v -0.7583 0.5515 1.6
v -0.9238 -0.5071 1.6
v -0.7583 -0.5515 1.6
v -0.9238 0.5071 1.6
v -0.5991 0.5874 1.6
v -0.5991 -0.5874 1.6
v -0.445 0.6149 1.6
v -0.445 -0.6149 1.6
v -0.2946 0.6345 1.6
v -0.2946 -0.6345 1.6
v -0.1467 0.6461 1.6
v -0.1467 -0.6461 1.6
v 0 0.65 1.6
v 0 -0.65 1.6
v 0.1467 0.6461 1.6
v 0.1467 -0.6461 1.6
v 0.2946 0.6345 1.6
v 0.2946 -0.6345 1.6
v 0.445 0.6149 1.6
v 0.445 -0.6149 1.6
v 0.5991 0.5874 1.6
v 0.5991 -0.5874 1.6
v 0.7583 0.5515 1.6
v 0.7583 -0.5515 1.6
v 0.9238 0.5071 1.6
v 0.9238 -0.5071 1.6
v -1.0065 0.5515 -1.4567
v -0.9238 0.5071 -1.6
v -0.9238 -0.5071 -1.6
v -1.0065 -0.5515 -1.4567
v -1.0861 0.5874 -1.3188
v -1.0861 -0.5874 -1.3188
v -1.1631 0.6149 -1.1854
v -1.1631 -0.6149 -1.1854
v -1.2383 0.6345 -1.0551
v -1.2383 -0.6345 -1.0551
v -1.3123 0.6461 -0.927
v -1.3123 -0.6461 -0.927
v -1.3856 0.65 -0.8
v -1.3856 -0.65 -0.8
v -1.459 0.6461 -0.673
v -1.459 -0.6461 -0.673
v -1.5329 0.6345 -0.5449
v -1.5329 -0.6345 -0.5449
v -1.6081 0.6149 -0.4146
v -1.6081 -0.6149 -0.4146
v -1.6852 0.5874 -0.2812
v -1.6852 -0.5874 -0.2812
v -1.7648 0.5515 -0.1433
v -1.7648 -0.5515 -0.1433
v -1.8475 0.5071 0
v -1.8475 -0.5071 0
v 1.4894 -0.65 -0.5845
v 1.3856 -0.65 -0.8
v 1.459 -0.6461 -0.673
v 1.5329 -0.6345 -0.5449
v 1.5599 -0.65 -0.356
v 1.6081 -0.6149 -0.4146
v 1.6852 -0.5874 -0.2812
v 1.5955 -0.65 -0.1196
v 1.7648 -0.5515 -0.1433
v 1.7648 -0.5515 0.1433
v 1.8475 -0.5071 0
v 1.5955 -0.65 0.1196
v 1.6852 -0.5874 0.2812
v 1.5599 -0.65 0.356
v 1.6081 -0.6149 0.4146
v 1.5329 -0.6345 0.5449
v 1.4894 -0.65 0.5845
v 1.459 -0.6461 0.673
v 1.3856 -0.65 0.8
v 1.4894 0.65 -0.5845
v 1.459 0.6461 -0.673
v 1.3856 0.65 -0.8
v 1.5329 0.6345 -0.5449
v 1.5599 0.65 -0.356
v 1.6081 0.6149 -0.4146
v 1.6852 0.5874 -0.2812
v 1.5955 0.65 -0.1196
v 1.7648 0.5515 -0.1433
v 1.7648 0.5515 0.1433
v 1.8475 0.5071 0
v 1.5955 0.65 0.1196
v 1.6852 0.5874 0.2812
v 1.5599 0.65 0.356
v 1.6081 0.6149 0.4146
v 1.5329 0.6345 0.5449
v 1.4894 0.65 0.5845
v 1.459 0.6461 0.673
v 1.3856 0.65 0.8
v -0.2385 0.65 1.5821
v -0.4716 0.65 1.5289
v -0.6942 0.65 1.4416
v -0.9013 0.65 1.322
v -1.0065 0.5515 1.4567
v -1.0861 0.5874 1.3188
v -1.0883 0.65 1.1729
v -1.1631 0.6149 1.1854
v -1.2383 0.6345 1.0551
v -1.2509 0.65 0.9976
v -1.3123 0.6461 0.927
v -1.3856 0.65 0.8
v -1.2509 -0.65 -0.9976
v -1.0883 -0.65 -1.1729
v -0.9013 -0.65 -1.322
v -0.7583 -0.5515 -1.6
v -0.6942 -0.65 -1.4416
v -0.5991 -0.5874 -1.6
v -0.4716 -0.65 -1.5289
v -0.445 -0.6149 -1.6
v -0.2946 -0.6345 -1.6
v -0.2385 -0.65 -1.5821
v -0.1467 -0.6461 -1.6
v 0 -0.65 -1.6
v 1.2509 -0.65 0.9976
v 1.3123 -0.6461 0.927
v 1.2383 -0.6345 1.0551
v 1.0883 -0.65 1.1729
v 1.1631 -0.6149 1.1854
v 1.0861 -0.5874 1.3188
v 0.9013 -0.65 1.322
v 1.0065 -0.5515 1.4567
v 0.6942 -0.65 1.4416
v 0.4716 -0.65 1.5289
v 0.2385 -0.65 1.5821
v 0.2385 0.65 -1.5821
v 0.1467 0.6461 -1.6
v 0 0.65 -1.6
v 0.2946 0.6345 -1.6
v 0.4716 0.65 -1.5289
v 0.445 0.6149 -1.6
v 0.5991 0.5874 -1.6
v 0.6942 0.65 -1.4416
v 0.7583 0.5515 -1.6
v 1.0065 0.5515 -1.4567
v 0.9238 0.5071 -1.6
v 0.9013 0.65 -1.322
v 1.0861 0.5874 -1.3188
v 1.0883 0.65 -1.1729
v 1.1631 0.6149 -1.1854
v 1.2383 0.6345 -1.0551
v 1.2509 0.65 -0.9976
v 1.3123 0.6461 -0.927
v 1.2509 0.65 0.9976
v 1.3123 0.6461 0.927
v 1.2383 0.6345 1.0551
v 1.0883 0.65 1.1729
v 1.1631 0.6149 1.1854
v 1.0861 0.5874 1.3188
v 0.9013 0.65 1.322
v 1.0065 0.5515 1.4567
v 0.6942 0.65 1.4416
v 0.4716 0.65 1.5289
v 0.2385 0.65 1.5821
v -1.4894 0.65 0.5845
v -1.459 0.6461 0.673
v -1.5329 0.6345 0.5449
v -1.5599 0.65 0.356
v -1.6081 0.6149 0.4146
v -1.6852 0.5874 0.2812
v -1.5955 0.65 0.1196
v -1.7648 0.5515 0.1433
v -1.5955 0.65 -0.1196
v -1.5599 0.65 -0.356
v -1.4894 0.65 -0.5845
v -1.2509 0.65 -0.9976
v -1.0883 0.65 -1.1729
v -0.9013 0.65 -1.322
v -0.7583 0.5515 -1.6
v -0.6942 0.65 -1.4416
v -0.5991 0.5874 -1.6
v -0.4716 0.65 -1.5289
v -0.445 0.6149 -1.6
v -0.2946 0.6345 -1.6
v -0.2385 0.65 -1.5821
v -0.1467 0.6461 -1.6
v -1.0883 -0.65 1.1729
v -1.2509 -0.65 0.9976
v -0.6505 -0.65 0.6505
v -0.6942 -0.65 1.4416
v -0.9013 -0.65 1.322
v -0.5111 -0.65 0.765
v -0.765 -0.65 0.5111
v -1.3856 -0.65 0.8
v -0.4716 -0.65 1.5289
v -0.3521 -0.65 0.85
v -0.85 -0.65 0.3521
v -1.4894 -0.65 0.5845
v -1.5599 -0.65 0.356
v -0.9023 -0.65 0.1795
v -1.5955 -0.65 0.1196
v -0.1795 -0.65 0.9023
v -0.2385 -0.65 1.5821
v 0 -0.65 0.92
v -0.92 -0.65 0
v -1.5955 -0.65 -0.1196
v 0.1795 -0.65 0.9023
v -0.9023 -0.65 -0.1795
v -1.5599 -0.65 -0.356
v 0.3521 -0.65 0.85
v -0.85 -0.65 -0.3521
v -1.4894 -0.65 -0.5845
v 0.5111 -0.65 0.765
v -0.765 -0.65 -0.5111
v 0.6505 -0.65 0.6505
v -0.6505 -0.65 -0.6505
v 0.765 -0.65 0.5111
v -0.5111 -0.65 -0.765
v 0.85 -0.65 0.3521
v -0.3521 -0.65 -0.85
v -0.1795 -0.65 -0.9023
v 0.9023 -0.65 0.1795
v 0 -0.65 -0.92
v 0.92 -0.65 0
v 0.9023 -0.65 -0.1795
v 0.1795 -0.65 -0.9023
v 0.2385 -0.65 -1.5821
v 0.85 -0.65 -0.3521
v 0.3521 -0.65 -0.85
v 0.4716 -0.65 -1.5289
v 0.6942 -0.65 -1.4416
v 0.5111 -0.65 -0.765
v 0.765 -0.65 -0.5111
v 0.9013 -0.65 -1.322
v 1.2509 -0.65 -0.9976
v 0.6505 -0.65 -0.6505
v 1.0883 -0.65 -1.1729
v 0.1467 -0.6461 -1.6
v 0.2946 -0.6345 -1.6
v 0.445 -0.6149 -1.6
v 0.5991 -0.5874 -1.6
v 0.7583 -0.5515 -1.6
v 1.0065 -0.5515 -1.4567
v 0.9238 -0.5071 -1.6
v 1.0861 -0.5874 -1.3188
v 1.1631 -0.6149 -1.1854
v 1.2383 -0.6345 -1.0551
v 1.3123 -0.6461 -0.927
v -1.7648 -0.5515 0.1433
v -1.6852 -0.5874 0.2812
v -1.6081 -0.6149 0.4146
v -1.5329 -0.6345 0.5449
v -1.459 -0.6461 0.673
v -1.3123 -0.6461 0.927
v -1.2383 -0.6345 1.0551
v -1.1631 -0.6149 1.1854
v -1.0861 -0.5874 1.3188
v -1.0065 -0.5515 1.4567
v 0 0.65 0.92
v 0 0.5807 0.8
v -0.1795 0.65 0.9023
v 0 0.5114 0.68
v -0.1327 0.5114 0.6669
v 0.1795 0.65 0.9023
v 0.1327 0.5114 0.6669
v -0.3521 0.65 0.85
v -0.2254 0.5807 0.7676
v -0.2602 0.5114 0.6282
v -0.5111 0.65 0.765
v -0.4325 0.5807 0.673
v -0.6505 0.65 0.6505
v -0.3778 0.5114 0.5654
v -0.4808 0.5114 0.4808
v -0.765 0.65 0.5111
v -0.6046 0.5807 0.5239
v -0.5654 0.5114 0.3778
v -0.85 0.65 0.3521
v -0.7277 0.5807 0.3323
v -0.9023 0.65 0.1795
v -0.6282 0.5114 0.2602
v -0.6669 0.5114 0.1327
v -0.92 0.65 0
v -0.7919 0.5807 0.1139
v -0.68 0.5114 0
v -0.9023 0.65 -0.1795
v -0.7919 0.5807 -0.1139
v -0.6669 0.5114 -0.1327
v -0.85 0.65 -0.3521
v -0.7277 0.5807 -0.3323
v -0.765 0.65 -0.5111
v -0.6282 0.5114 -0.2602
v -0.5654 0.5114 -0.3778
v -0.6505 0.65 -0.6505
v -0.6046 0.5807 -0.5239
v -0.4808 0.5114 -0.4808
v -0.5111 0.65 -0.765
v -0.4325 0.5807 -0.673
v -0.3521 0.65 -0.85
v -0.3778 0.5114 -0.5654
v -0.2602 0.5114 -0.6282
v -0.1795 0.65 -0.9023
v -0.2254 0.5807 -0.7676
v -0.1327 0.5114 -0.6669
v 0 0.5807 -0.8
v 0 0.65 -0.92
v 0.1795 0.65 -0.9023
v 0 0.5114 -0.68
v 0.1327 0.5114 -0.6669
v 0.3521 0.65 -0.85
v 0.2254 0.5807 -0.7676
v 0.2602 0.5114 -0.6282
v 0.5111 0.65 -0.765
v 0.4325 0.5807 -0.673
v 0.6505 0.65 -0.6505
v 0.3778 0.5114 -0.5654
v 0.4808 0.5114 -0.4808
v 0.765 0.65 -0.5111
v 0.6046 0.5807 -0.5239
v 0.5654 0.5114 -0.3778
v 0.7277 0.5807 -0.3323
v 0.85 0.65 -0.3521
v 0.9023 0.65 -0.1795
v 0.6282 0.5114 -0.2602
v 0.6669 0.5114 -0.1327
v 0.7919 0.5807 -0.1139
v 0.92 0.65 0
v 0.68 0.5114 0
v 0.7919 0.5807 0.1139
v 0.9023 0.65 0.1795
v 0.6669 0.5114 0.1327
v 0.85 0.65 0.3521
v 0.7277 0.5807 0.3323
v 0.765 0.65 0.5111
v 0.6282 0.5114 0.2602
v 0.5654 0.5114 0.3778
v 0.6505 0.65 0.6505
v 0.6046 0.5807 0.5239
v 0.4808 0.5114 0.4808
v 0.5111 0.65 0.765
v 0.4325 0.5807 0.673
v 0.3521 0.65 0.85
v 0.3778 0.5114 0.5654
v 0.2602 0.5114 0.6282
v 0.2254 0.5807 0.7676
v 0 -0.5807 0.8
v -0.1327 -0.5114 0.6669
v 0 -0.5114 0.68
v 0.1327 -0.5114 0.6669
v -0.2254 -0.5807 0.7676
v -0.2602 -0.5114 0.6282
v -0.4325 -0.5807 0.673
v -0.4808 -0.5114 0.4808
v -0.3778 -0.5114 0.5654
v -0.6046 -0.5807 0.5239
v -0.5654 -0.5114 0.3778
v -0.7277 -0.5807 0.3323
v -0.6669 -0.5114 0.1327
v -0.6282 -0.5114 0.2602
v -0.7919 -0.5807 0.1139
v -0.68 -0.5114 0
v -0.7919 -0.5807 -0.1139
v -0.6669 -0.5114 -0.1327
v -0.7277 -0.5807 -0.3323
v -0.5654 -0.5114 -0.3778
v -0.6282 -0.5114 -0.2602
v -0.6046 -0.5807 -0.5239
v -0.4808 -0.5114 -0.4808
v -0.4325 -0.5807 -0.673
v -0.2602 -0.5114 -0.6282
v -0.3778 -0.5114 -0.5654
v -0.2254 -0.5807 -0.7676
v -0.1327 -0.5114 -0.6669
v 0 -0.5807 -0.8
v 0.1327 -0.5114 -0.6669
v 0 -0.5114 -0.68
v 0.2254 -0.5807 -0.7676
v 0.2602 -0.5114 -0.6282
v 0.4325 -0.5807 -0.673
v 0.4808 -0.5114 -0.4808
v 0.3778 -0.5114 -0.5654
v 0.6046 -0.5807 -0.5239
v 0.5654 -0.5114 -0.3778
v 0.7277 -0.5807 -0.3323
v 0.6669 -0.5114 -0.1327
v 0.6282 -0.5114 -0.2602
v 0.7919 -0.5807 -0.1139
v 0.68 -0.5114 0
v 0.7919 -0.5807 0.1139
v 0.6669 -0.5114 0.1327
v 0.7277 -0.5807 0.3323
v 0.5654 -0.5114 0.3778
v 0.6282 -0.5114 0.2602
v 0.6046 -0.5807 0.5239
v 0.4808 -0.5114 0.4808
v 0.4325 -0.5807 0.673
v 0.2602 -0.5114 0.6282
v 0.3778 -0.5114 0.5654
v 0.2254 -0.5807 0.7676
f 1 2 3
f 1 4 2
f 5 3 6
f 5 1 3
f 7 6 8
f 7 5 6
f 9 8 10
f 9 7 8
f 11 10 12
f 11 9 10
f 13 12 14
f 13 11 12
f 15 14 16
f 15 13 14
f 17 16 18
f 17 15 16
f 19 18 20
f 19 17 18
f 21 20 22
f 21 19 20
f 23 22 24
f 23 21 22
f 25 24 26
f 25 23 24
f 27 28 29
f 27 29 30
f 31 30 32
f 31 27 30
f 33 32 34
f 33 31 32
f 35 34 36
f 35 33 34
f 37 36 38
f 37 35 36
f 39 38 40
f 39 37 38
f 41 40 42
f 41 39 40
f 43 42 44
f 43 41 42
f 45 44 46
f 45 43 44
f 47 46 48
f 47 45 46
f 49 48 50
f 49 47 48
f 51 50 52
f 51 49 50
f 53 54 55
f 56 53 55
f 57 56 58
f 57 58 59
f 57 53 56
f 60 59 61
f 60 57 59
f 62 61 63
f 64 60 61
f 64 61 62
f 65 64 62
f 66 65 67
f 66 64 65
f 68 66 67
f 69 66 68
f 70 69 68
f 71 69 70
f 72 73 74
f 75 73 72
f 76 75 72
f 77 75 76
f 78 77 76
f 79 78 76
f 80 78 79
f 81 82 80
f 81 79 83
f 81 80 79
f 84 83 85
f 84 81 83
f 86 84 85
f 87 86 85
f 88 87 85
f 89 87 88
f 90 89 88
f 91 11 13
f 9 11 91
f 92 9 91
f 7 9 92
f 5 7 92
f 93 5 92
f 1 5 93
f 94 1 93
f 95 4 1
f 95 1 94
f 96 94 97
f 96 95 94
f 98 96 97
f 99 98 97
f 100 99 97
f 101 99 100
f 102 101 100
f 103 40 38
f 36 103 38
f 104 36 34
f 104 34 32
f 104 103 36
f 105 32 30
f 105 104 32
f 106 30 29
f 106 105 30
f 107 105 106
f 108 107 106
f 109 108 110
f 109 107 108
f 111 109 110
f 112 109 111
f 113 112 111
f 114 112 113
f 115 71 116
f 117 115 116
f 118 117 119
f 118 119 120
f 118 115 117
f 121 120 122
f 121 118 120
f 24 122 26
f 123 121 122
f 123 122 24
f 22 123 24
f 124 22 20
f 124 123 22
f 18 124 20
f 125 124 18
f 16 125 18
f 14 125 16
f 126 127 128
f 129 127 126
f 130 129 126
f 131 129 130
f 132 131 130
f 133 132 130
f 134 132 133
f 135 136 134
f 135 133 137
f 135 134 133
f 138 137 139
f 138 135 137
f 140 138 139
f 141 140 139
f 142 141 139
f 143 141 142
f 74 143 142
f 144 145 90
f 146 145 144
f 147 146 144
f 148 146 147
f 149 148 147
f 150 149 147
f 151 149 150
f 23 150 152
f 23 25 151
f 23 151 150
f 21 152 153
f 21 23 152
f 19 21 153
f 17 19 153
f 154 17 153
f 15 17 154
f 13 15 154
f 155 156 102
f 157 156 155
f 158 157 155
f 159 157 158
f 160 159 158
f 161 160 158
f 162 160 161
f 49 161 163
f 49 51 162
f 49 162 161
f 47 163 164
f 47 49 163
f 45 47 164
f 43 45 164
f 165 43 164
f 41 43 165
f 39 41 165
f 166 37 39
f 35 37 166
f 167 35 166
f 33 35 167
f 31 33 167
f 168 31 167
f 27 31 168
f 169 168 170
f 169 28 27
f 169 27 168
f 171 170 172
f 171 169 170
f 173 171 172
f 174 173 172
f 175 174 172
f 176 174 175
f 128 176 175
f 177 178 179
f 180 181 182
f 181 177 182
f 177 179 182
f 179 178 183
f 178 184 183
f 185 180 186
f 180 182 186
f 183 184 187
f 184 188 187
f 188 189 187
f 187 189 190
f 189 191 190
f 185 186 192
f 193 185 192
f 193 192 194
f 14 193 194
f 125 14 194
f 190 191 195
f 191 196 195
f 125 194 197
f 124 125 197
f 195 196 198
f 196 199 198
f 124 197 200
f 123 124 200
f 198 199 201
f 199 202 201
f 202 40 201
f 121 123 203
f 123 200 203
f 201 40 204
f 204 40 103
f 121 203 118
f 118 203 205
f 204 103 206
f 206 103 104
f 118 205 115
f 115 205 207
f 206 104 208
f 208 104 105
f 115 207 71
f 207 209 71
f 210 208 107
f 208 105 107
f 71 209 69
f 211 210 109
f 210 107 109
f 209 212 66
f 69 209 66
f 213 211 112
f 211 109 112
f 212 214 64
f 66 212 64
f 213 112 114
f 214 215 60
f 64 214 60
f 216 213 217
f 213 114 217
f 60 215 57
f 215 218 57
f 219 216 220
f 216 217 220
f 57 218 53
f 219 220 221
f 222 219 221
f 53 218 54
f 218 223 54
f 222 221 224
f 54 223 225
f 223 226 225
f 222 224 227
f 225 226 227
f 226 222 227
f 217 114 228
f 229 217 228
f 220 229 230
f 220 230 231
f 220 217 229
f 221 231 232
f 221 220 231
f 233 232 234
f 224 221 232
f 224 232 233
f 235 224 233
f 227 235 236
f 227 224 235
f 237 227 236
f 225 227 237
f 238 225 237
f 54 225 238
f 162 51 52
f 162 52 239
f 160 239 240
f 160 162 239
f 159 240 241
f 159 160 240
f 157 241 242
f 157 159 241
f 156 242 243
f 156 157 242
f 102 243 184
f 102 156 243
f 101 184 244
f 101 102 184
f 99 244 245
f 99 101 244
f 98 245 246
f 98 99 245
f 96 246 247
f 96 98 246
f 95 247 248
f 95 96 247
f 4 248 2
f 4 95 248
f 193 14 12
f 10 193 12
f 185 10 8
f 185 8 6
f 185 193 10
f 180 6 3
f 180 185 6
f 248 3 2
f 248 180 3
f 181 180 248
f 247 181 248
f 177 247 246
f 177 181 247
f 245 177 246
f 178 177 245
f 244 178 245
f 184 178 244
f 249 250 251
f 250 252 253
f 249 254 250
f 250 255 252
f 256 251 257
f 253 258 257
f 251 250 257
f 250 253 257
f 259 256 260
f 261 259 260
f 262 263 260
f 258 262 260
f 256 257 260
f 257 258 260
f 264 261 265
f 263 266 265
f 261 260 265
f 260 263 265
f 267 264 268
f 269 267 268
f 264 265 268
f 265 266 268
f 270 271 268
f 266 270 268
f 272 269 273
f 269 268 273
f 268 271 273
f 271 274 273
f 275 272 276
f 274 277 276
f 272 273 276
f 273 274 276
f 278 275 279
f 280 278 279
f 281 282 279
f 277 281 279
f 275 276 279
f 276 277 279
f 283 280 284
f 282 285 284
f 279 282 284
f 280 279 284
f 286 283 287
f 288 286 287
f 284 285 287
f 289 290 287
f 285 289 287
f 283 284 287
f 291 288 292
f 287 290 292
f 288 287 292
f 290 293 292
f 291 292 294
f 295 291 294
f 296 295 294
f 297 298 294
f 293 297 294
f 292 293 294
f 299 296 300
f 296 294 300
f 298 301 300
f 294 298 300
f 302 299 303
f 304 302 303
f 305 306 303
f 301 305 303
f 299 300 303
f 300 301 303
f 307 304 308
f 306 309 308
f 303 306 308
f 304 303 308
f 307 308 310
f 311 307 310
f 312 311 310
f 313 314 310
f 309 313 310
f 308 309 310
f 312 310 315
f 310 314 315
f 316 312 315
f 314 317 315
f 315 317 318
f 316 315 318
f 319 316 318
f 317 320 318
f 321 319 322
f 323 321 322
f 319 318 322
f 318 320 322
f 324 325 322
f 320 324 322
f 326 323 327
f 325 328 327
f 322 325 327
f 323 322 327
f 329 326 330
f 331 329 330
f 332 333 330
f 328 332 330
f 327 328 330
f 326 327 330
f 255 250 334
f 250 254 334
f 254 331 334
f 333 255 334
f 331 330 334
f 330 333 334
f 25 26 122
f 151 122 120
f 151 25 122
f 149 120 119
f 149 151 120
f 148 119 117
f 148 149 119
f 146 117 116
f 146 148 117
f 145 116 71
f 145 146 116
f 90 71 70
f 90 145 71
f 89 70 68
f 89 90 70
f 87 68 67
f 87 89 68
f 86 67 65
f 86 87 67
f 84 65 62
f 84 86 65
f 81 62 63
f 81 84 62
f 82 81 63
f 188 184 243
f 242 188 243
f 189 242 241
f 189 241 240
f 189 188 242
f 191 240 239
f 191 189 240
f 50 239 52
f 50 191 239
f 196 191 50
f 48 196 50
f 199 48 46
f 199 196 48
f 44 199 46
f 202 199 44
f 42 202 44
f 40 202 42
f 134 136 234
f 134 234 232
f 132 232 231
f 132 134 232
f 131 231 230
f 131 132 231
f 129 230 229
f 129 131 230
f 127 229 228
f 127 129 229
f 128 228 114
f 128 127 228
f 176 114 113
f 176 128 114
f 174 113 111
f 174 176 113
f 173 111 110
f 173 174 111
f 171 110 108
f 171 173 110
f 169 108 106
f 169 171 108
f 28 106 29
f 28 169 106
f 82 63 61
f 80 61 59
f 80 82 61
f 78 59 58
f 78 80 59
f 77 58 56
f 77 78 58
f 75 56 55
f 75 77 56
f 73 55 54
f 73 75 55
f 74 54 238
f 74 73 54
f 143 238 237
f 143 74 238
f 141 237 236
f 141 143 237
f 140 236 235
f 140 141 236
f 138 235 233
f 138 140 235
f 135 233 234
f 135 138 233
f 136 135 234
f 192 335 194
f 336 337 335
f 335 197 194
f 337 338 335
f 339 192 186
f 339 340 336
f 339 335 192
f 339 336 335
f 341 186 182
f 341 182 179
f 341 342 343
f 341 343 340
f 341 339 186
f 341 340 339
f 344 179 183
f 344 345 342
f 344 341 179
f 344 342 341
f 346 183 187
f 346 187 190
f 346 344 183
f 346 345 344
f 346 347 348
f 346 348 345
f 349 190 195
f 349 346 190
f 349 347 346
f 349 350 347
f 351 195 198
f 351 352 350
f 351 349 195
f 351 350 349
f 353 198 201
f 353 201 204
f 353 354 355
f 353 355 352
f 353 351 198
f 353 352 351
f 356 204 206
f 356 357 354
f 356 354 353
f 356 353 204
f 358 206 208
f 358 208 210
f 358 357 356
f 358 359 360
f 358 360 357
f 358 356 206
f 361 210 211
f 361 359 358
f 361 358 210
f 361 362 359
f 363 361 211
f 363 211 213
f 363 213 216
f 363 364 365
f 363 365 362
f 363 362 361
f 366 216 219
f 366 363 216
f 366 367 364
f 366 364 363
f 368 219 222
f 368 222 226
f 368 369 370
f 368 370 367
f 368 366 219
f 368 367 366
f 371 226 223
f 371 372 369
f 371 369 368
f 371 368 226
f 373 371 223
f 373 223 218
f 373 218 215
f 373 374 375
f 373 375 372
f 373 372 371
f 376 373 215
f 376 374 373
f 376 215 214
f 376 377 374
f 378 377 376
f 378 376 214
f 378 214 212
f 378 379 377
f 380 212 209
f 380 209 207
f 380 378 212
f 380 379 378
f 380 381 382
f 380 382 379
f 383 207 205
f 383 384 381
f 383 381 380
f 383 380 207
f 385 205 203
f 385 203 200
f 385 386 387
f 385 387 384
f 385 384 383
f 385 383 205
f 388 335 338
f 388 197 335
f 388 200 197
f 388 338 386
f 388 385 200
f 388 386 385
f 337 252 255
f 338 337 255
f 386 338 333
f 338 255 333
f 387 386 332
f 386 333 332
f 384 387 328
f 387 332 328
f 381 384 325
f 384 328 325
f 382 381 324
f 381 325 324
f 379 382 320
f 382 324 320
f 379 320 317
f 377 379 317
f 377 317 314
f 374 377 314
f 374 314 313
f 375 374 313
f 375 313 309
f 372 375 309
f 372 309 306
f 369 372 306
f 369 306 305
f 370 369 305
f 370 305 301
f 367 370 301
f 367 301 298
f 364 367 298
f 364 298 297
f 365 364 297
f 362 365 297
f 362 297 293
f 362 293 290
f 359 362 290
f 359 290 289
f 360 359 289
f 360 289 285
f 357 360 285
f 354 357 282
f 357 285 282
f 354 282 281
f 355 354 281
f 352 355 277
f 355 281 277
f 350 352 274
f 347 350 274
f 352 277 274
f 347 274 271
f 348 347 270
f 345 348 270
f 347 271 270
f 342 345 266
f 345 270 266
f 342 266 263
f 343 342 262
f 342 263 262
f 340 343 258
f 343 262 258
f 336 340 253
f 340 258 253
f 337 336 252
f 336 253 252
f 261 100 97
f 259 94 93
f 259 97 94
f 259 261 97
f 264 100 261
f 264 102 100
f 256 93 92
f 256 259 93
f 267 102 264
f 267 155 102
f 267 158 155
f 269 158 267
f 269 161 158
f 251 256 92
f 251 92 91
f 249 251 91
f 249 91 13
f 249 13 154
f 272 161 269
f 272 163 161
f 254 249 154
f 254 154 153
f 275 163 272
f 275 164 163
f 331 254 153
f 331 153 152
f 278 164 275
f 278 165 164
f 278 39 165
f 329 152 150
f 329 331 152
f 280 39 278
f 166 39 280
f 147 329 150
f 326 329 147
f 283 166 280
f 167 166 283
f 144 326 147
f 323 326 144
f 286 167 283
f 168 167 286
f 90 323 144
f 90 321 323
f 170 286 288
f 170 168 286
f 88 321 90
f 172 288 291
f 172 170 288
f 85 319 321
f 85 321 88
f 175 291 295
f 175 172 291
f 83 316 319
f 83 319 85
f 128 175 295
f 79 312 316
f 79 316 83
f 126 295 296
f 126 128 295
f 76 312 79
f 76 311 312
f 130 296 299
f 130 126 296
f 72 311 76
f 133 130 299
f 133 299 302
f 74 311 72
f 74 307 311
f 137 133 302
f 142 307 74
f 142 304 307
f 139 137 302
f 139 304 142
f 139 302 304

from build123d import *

# Parameters (mm, degrees)
VYSUNOUT1_DEPTH          = 0.65
SKICA3_R                 = 0.68
ODEBRAT_VYSUNUT_M1_DEPTH = 3.768272626


with BuildPart() as part:
    # Skica1 → Vysunout1 (new, symmetric)
    with BuildSketch(Plane(origin=(0, 0, 0), x_dir=(1, 0, 0), z_dir=(0, 1, 0))):
        Polygon((1.847520861, 0), (0.923760431, 1.6), (-0.923760431, 1.6), (-1.847520861, 0), (-0.923760431, -1.6), (0.923760431, -1.6), align=None)
    extrude(amount=VYSUNOUT1_DEPTH, both=True)

    # Skica2 → Odebrat otočením1 (revolve, cut)
    with BuildSketch(Plane(origin=(0, 0, 0), x_dir=(0, 0, -1), z_dir=(1, 0, 0))):
        Polygon((2.725833025, 0.65), (1.6, 0.65), (2.725833025, 0), align=None)
        Polygon((2.725833025, -0.65), (2.725833025, 0), (1.6, -0.65), align=None)
    revolve(axis=Axis((0, 0.65, 0), (0, -1, 0)), mode=Mode.SUBTRACT)

    # Skica3 → Odebrat vysunutím1 (cut, through all)
    with BuildSketch(Plane(origin=(0, 0.65, 0), x_dir=(-1, 0, 0), z_dir=(0, 1, 0))):
        with Locations(Location((0, 0, 0), (0, 0, 90))):
            Circle(SKICA3_R)
    extrude(amount=-ODEBRAT_VYSUNUT_M1_DEPTH, mode=Mode.SUBTRACT)

    # Odebrat vysunutím2 cone 1 section (through the dimple's axis) → Odebrat vysunutím2 (revolve, cut)
    with BuildSketch(Plane(origin=(0, 0.65, 0), x_dir=(0, 0, 1), z_dir=(1, 0, 0))):
        Polygon((0, 0), (0.92, 0), (0, 0.531162248), align=None)
    odebrat_vysunut_m2 = revolve(axis=Axis((0, 0.65, 0), (0, -1, 0)), mode=Mode.SUBTRACT)

    # Zrcadlit1: Odebrat vysunutím2 across plane
    add(odebrat_vysunut_m2.mirror(Plane.ZX), mode=Mode.SUBTRACT)


solid = part.part
